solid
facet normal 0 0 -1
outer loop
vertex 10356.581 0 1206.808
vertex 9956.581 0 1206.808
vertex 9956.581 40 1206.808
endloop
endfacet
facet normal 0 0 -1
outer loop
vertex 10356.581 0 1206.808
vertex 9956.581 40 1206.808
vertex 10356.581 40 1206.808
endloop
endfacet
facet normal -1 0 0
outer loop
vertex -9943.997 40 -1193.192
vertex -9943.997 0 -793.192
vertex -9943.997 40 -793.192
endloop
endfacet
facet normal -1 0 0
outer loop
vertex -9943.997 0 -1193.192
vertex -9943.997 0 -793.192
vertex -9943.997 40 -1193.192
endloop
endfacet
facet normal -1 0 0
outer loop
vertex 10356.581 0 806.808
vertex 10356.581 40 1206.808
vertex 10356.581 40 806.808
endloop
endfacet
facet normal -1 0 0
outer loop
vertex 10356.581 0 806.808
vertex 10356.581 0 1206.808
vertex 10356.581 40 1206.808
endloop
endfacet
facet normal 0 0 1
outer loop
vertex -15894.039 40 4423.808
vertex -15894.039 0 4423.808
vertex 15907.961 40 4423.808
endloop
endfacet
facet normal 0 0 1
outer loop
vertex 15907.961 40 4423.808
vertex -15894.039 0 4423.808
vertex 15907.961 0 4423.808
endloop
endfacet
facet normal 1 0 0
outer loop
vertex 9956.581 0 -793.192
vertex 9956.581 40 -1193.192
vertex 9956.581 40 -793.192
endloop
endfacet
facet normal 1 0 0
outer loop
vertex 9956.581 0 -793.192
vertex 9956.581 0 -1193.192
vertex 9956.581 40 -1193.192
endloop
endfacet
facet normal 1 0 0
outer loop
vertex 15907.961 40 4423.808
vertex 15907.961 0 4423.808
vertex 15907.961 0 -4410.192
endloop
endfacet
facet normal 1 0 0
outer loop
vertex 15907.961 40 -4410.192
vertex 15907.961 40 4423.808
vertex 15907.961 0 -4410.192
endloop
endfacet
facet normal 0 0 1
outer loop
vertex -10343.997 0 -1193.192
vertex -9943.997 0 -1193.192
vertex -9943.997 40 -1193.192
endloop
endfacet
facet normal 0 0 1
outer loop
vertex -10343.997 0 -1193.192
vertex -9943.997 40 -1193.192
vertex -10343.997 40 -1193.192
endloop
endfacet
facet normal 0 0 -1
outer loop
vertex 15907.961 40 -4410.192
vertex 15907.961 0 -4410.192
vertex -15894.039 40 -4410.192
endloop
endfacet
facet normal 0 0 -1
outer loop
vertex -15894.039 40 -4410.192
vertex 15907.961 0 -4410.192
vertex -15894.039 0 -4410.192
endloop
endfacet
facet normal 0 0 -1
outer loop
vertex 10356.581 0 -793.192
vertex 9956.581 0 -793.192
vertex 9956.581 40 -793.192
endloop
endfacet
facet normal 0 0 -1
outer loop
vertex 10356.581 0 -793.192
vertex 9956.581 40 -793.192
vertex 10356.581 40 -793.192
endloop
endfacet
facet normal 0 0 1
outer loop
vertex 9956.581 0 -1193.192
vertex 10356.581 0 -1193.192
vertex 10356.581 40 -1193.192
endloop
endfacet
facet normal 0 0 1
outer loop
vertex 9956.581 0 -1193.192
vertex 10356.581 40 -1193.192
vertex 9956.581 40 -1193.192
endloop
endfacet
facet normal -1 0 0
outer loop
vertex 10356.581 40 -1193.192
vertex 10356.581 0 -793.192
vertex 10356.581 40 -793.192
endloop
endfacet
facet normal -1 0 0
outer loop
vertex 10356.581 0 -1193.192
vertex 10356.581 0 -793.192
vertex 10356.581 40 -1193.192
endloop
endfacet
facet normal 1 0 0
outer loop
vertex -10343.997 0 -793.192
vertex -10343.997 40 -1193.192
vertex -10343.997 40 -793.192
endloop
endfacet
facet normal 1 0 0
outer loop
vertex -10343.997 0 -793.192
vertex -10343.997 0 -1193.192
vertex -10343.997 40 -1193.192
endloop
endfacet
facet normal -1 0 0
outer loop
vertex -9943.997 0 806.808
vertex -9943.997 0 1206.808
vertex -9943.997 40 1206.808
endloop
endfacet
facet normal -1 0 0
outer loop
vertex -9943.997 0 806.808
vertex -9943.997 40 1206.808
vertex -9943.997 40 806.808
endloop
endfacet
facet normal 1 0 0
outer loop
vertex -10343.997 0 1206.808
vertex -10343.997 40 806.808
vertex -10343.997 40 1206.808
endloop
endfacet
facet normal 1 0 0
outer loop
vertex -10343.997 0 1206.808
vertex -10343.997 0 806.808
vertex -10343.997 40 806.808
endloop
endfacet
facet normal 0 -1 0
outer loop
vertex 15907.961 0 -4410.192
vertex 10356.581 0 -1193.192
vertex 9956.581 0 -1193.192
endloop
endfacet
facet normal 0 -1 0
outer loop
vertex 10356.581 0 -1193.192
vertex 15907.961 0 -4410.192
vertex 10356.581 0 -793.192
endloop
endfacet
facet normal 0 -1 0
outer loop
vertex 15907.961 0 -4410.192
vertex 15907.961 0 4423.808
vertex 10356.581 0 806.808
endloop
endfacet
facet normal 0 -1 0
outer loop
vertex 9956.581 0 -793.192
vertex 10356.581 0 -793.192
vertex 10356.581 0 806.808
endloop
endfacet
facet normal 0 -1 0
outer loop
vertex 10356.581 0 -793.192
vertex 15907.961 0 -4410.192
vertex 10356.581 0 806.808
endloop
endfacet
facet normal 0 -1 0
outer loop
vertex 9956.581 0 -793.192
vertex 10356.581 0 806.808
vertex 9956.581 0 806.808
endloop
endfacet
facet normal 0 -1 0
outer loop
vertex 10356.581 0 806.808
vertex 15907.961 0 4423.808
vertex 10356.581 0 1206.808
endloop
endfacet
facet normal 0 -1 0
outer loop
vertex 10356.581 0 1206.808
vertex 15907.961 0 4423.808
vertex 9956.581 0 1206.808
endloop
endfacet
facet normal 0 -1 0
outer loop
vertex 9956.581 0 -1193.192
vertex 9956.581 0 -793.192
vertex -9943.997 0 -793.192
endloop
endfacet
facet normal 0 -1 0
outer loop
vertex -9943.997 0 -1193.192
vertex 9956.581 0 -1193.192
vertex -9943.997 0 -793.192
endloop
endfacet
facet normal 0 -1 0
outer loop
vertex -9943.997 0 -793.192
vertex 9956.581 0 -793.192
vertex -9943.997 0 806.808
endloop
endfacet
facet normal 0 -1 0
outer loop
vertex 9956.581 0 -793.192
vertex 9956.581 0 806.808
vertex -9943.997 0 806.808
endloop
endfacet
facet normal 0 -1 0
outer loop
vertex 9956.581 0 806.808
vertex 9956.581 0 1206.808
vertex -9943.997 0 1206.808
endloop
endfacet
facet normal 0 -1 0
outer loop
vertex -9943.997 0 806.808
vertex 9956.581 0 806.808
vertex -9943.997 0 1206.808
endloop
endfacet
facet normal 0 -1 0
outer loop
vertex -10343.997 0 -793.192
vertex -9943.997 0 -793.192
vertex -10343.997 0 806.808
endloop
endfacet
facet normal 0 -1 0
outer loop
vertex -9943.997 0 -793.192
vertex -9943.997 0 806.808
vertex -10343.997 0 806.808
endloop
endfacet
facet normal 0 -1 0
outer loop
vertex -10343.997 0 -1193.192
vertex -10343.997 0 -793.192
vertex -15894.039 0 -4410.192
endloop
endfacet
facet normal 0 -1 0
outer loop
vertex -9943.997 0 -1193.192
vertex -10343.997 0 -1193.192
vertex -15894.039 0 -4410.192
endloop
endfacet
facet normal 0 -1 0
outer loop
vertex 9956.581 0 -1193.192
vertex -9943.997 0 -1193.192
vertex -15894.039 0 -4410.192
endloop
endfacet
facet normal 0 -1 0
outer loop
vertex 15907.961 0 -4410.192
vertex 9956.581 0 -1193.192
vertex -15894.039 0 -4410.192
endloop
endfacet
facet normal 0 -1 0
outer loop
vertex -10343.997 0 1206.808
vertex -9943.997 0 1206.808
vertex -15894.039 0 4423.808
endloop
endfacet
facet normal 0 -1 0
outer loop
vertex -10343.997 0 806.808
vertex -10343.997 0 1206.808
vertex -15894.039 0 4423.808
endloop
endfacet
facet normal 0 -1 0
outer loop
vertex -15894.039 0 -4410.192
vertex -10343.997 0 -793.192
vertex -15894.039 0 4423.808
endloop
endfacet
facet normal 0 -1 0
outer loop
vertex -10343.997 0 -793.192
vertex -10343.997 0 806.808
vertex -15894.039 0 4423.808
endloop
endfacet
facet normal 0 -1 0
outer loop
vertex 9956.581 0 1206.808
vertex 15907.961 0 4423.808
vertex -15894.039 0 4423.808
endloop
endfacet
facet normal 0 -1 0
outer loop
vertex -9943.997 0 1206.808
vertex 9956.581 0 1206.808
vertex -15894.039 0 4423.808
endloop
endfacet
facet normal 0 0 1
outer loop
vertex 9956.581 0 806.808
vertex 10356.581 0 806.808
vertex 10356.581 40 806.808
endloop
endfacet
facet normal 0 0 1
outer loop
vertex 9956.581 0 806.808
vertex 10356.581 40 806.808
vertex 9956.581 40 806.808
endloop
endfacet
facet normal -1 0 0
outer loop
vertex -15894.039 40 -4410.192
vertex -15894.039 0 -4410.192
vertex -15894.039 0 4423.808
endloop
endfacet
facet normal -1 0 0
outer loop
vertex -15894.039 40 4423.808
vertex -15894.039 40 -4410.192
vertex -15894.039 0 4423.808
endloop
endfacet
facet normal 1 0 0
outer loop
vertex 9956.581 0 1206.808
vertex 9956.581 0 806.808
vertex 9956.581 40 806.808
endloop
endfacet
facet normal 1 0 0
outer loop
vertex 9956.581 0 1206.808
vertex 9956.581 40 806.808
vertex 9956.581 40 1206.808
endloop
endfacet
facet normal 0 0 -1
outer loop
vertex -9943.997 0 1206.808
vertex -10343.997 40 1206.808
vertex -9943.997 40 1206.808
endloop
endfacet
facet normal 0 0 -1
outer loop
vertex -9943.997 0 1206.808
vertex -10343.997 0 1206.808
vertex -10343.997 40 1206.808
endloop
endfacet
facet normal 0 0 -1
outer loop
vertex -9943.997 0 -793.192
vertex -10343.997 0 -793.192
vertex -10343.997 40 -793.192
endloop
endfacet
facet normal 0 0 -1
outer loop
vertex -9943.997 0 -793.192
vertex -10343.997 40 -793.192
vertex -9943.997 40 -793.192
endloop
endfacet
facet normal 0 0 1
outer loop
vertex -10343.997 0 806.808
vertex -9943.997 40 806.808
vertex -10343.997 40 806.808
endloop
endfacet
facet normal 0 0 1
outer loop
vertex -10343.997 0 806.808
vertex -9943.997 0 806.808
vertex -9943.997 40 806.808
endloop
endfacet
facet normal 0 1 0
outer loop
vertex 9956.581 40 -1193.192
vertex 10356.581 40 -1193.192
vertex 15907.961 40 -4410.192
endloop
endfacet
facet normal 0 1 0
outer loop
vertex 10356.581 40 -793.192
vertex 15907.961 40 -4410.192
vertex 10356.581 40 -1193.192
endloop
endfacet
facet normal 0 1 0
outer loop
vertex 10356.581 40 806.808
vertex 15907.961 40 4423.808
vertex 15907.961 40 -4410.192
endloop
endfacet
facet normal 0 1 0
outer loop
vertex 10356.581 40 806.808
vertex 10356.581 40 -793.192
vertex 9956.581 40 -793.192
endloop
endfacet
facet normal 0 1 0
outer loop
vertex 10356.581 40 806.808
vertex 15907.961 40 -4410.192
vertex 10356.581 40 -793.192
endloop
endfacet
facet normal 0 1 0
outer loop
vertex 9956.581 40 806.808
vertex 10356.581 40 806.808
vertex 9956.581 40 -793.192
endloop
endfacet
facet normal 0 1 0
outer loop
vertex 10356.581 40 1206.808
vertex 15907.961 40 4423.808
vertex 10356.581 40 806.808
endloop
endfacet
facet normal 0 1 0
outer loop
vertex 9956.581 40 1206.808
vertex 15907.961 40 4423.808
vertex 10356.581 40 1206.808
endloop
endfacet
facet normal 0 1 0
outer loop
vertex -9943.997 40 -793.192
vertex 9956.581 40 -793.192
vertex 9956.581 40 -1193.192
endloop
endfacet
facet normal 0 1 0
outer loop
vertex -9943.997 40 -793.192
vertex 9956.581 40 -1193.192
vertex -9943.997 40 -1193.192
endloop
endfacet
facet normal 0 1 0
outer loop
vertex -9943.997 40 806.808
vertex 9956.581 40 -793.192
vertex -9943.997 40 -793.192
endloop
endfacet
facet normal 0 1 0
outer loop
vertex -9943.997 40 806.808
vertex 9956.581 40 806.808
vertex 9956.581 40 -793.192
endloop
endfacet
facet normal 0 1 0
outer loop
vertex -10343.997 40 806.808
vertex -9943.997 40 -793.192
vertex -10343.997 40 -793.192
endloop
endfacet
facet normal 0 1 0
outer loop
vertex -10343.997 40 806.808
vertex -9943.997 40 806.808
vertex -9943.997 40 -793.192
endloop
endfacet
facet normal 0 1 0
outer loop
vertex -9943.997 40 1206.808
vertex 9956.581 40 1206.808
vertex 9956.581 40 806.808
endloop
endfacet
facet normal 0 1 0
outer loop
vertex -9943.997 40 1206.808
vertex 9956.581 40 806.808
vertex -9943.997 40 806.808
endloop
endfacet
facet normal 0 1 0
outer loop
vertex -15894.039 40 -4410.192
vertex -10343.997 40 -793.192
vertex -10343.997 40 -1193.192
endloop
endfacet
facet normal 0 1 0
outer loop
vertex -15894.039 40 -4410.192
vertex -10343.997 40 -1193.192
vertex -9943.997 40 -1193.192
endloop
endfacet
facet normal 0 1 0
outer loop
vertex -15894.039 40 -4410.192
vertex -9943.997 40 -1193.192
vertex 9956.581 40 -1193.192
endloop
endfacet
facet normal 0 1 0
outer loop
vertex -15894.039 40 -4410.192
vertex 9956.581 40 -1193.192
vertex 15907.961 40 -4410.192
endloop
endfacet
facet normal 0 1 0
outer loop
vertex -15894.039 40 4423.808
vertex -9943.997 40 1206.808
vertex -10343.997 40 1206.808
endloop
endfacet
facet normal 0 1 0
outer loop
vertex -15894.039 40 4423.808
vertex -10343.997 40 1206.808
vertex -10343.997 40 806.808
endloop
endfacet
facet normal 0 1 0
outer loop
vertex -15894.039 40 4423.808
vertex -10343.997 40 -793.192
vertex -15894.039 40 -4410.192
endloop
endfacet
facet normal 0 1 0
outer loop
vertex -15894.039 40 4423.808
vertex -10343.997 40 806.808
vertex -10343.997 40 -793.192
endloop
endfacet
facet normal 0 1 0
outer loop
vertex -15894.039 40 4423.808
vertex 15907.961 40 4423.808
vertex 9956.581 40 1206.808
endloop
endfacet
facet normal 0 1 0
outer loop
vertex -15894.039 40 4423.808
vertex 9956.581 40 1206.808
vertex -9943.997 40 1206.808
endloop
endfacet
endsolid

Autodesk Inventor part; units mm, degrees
ref_plane "YZ Plane" through (0, 0, 0) normal (1, 0, 0) x (0, 1, 0)
ref_plane "XZ Plane" through (0, 0, 0) normal (0, 1, 0) x (-1, 0, 0)
ref_plane "XY Plane" through (0, 0, 0) normal (0, 0, 1) x (1, 0, 0)
sketch "Sketch1" plane through (0, 0, 0) normal (0, 1, 0) x (-1, 0, 0)
  line L0 (15894.0391, 4423.8081) -> (-15907.9609, 4423.8081)
  line L1 (-15907.9609, -4410.1915) -> (15894.0391, -4410.1915)
  line L2 (10343.9966, -793.1917) -> (9943.9966, -793.1917)
  line L3 (9943.9966, -793.1917) -> (9943.9966, -1193.1917)
  line L4 (9943.9966, -1193.1917) -> (10343.9966, -1193.1917)
  line L5 (10343.9966, -1193.1917) -> (10343.9966, -793.1917)
  line L6 (10343.9966, 1206.8083) -> (9943.9966, 1206.8083)
  line L7 (9943.9966, 1206.8083) -> (9943.9966, 806.8083)
  line L8 (9943.9966, 806.8083) -> (10343.9966, 806.8083)
  line L9 (10343.9966, 806.8083) -> (10343.9966, 1206.8083)
  line L10 (-9956.5806, -793.1917) -> (-10356.5806, -793.1917)
  line L11 (-10356.5806, -793.1917) -> (-10356.5806, -1193.1917)
  line L12 (-10356.5806, -1193.1917) -> (-9956.5806, -1193.1917)
  line L13 (-9956.5806, -1193.1917) -> (-9956.5806, -793.1917)
  line L14 (-9956.5806, 1206.8083) -> (-10356.5806, 1206.8083)
  line L15 (-10356.5806, 1206.8083) -> (-10356.5806, 806.8083)
  line L16 (-10356.5806, 806.8083) -> (-9956.5806, 806.8083)
  line L17 (-9956.5806, 806.8083) -> (-9956.5806, 1206.8083)
  line L18 (-15907.9609, 606.8024) -> (-14407.9609, 606.8024)
  line L19 (-14407.9609, 606.8024) -> (-14407.9609, -588.4462)
  line L20 (-14407.9609, -588.4462) -> (-15907.9609, -588.4462)
  line L21 (15894.0391, 606.8024) -> (14394.0391, 606.8024)
  line L22 (14394.0391, 606.8024) -> (14394.0391, -588.4462)
  line L23 (14394.0391, -588.4462) -> (15894.0391, -588.4462)
  line L24 (15894.0391, -4410.1915) -> (15894.0391, -588.4462)
  line L25 (15894.0391, 606.8024) -> (15894.0391, 4423.8081)
  line L26 (-15907.9609, 4423.8081) -> (-15907.9609, 606.8024)
  line L27 (-15907.9609, -588.4462) -> (-15907.9609, -4410.1915)
  point P0 (0, 0)
  point P1 (-15907.9609, -588.4462)
  point P2 (15894.0391, -588.4462)
  dimension "d0" = 1500
  dimension "d1" = 1500
extrude "Extrusion1" add sketch "Sketch1" along normal blind 40
sketch "Sketch2" plane through (0, 40, 0) normal (0, 1, 0) x (1, 0, 0)
  line L0 (-15894.0391, 588.4462) -> (-14394.0391, 588.4462) projected
  line L1 (-15894.0391, -606.8024) -> (-15894.0391, -4423.8081) projected
  line L2 (-15894.0391, 588.4462) -> (-15894.0391, -606.8024)
  line L3 (-15894.0391, -606.8024) -> (-14381.5011, -606.8024)
  line L4 (-14381.5011, -606.8024) -> (-14381.5011, 588.4462)
  line L5 (-14381.5011, 588.4462) -> (-15894.0391, 588.4462)
  line L6 (15907.9609, -4423.8081) -> (15907.9609, -606.8024) projected
  line L7 (14407.9609, 588.4462) -> (15907.9609, 588.4462)
  line L8 (15907.9609, 588.4462) -> (15907.9609, -606.8024)
  line L9 (15907.9609, -606.8024) -> (14407.9609, -606.8024)
  line L10 (14407.9609, -606.8024) -> (14407.9609, 588.4462)
  point P0 (0, 0)
extrude "Extrusion2" add sketch "Sketch2" against normal blind 40
properties part number "inside_floor" material "Wood (Maple)"
